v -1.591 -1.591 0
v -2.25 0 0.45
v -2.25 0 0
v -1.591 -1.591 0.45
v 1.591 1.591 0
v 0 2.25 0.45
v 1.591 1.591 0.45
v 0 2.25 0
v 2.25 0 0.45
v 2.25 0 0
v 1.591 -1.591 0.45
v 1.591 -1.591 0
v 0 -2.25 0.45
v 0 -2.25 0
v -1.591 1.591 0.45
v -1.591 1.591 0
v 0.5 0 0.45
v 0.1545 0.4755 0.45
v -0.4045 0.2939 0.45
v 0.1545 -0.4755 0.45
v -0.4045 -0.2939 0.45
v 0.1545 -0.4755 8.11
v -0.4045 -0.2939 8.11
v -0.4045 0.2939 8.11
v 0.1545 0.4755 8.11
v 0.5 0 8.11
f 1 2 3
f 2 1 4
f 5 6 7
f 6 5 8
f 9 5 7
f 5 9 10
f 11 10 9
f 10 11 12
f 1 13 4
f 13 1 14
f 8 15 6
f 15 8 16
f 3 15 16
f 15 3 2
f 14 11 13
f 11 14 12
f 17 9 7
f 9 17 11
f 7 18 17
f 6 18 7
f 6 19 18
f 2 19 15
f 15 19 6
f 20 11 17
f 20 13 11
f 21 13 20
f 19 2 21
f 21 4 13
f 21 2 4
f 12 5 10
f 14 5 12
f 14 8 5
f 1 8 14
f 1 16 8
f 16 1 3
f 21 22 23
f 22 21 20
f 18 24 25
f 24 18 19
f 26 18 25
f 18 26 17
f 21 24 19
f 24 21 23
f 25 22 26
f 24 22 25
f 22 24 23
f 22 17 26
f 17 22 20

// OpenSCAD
cylinder( r = 2.25, h=0.45 );
cylinder( r = 0.5, h=8.11 );

// Written by Marius Kintel <marius@kintel.net>
//
// To the extent possible under law, the author(s) have dedicated all
// copyright and related and neighboring rights to this software to the
// public domain worldwide. This software is distributed without any
// warranty.
//
// You should have received a copy of the CC0 Public Domain
// Dedication along with this software.
// If not, see <http://creativecommons.org/publicdomain/zero/1.0/>.
